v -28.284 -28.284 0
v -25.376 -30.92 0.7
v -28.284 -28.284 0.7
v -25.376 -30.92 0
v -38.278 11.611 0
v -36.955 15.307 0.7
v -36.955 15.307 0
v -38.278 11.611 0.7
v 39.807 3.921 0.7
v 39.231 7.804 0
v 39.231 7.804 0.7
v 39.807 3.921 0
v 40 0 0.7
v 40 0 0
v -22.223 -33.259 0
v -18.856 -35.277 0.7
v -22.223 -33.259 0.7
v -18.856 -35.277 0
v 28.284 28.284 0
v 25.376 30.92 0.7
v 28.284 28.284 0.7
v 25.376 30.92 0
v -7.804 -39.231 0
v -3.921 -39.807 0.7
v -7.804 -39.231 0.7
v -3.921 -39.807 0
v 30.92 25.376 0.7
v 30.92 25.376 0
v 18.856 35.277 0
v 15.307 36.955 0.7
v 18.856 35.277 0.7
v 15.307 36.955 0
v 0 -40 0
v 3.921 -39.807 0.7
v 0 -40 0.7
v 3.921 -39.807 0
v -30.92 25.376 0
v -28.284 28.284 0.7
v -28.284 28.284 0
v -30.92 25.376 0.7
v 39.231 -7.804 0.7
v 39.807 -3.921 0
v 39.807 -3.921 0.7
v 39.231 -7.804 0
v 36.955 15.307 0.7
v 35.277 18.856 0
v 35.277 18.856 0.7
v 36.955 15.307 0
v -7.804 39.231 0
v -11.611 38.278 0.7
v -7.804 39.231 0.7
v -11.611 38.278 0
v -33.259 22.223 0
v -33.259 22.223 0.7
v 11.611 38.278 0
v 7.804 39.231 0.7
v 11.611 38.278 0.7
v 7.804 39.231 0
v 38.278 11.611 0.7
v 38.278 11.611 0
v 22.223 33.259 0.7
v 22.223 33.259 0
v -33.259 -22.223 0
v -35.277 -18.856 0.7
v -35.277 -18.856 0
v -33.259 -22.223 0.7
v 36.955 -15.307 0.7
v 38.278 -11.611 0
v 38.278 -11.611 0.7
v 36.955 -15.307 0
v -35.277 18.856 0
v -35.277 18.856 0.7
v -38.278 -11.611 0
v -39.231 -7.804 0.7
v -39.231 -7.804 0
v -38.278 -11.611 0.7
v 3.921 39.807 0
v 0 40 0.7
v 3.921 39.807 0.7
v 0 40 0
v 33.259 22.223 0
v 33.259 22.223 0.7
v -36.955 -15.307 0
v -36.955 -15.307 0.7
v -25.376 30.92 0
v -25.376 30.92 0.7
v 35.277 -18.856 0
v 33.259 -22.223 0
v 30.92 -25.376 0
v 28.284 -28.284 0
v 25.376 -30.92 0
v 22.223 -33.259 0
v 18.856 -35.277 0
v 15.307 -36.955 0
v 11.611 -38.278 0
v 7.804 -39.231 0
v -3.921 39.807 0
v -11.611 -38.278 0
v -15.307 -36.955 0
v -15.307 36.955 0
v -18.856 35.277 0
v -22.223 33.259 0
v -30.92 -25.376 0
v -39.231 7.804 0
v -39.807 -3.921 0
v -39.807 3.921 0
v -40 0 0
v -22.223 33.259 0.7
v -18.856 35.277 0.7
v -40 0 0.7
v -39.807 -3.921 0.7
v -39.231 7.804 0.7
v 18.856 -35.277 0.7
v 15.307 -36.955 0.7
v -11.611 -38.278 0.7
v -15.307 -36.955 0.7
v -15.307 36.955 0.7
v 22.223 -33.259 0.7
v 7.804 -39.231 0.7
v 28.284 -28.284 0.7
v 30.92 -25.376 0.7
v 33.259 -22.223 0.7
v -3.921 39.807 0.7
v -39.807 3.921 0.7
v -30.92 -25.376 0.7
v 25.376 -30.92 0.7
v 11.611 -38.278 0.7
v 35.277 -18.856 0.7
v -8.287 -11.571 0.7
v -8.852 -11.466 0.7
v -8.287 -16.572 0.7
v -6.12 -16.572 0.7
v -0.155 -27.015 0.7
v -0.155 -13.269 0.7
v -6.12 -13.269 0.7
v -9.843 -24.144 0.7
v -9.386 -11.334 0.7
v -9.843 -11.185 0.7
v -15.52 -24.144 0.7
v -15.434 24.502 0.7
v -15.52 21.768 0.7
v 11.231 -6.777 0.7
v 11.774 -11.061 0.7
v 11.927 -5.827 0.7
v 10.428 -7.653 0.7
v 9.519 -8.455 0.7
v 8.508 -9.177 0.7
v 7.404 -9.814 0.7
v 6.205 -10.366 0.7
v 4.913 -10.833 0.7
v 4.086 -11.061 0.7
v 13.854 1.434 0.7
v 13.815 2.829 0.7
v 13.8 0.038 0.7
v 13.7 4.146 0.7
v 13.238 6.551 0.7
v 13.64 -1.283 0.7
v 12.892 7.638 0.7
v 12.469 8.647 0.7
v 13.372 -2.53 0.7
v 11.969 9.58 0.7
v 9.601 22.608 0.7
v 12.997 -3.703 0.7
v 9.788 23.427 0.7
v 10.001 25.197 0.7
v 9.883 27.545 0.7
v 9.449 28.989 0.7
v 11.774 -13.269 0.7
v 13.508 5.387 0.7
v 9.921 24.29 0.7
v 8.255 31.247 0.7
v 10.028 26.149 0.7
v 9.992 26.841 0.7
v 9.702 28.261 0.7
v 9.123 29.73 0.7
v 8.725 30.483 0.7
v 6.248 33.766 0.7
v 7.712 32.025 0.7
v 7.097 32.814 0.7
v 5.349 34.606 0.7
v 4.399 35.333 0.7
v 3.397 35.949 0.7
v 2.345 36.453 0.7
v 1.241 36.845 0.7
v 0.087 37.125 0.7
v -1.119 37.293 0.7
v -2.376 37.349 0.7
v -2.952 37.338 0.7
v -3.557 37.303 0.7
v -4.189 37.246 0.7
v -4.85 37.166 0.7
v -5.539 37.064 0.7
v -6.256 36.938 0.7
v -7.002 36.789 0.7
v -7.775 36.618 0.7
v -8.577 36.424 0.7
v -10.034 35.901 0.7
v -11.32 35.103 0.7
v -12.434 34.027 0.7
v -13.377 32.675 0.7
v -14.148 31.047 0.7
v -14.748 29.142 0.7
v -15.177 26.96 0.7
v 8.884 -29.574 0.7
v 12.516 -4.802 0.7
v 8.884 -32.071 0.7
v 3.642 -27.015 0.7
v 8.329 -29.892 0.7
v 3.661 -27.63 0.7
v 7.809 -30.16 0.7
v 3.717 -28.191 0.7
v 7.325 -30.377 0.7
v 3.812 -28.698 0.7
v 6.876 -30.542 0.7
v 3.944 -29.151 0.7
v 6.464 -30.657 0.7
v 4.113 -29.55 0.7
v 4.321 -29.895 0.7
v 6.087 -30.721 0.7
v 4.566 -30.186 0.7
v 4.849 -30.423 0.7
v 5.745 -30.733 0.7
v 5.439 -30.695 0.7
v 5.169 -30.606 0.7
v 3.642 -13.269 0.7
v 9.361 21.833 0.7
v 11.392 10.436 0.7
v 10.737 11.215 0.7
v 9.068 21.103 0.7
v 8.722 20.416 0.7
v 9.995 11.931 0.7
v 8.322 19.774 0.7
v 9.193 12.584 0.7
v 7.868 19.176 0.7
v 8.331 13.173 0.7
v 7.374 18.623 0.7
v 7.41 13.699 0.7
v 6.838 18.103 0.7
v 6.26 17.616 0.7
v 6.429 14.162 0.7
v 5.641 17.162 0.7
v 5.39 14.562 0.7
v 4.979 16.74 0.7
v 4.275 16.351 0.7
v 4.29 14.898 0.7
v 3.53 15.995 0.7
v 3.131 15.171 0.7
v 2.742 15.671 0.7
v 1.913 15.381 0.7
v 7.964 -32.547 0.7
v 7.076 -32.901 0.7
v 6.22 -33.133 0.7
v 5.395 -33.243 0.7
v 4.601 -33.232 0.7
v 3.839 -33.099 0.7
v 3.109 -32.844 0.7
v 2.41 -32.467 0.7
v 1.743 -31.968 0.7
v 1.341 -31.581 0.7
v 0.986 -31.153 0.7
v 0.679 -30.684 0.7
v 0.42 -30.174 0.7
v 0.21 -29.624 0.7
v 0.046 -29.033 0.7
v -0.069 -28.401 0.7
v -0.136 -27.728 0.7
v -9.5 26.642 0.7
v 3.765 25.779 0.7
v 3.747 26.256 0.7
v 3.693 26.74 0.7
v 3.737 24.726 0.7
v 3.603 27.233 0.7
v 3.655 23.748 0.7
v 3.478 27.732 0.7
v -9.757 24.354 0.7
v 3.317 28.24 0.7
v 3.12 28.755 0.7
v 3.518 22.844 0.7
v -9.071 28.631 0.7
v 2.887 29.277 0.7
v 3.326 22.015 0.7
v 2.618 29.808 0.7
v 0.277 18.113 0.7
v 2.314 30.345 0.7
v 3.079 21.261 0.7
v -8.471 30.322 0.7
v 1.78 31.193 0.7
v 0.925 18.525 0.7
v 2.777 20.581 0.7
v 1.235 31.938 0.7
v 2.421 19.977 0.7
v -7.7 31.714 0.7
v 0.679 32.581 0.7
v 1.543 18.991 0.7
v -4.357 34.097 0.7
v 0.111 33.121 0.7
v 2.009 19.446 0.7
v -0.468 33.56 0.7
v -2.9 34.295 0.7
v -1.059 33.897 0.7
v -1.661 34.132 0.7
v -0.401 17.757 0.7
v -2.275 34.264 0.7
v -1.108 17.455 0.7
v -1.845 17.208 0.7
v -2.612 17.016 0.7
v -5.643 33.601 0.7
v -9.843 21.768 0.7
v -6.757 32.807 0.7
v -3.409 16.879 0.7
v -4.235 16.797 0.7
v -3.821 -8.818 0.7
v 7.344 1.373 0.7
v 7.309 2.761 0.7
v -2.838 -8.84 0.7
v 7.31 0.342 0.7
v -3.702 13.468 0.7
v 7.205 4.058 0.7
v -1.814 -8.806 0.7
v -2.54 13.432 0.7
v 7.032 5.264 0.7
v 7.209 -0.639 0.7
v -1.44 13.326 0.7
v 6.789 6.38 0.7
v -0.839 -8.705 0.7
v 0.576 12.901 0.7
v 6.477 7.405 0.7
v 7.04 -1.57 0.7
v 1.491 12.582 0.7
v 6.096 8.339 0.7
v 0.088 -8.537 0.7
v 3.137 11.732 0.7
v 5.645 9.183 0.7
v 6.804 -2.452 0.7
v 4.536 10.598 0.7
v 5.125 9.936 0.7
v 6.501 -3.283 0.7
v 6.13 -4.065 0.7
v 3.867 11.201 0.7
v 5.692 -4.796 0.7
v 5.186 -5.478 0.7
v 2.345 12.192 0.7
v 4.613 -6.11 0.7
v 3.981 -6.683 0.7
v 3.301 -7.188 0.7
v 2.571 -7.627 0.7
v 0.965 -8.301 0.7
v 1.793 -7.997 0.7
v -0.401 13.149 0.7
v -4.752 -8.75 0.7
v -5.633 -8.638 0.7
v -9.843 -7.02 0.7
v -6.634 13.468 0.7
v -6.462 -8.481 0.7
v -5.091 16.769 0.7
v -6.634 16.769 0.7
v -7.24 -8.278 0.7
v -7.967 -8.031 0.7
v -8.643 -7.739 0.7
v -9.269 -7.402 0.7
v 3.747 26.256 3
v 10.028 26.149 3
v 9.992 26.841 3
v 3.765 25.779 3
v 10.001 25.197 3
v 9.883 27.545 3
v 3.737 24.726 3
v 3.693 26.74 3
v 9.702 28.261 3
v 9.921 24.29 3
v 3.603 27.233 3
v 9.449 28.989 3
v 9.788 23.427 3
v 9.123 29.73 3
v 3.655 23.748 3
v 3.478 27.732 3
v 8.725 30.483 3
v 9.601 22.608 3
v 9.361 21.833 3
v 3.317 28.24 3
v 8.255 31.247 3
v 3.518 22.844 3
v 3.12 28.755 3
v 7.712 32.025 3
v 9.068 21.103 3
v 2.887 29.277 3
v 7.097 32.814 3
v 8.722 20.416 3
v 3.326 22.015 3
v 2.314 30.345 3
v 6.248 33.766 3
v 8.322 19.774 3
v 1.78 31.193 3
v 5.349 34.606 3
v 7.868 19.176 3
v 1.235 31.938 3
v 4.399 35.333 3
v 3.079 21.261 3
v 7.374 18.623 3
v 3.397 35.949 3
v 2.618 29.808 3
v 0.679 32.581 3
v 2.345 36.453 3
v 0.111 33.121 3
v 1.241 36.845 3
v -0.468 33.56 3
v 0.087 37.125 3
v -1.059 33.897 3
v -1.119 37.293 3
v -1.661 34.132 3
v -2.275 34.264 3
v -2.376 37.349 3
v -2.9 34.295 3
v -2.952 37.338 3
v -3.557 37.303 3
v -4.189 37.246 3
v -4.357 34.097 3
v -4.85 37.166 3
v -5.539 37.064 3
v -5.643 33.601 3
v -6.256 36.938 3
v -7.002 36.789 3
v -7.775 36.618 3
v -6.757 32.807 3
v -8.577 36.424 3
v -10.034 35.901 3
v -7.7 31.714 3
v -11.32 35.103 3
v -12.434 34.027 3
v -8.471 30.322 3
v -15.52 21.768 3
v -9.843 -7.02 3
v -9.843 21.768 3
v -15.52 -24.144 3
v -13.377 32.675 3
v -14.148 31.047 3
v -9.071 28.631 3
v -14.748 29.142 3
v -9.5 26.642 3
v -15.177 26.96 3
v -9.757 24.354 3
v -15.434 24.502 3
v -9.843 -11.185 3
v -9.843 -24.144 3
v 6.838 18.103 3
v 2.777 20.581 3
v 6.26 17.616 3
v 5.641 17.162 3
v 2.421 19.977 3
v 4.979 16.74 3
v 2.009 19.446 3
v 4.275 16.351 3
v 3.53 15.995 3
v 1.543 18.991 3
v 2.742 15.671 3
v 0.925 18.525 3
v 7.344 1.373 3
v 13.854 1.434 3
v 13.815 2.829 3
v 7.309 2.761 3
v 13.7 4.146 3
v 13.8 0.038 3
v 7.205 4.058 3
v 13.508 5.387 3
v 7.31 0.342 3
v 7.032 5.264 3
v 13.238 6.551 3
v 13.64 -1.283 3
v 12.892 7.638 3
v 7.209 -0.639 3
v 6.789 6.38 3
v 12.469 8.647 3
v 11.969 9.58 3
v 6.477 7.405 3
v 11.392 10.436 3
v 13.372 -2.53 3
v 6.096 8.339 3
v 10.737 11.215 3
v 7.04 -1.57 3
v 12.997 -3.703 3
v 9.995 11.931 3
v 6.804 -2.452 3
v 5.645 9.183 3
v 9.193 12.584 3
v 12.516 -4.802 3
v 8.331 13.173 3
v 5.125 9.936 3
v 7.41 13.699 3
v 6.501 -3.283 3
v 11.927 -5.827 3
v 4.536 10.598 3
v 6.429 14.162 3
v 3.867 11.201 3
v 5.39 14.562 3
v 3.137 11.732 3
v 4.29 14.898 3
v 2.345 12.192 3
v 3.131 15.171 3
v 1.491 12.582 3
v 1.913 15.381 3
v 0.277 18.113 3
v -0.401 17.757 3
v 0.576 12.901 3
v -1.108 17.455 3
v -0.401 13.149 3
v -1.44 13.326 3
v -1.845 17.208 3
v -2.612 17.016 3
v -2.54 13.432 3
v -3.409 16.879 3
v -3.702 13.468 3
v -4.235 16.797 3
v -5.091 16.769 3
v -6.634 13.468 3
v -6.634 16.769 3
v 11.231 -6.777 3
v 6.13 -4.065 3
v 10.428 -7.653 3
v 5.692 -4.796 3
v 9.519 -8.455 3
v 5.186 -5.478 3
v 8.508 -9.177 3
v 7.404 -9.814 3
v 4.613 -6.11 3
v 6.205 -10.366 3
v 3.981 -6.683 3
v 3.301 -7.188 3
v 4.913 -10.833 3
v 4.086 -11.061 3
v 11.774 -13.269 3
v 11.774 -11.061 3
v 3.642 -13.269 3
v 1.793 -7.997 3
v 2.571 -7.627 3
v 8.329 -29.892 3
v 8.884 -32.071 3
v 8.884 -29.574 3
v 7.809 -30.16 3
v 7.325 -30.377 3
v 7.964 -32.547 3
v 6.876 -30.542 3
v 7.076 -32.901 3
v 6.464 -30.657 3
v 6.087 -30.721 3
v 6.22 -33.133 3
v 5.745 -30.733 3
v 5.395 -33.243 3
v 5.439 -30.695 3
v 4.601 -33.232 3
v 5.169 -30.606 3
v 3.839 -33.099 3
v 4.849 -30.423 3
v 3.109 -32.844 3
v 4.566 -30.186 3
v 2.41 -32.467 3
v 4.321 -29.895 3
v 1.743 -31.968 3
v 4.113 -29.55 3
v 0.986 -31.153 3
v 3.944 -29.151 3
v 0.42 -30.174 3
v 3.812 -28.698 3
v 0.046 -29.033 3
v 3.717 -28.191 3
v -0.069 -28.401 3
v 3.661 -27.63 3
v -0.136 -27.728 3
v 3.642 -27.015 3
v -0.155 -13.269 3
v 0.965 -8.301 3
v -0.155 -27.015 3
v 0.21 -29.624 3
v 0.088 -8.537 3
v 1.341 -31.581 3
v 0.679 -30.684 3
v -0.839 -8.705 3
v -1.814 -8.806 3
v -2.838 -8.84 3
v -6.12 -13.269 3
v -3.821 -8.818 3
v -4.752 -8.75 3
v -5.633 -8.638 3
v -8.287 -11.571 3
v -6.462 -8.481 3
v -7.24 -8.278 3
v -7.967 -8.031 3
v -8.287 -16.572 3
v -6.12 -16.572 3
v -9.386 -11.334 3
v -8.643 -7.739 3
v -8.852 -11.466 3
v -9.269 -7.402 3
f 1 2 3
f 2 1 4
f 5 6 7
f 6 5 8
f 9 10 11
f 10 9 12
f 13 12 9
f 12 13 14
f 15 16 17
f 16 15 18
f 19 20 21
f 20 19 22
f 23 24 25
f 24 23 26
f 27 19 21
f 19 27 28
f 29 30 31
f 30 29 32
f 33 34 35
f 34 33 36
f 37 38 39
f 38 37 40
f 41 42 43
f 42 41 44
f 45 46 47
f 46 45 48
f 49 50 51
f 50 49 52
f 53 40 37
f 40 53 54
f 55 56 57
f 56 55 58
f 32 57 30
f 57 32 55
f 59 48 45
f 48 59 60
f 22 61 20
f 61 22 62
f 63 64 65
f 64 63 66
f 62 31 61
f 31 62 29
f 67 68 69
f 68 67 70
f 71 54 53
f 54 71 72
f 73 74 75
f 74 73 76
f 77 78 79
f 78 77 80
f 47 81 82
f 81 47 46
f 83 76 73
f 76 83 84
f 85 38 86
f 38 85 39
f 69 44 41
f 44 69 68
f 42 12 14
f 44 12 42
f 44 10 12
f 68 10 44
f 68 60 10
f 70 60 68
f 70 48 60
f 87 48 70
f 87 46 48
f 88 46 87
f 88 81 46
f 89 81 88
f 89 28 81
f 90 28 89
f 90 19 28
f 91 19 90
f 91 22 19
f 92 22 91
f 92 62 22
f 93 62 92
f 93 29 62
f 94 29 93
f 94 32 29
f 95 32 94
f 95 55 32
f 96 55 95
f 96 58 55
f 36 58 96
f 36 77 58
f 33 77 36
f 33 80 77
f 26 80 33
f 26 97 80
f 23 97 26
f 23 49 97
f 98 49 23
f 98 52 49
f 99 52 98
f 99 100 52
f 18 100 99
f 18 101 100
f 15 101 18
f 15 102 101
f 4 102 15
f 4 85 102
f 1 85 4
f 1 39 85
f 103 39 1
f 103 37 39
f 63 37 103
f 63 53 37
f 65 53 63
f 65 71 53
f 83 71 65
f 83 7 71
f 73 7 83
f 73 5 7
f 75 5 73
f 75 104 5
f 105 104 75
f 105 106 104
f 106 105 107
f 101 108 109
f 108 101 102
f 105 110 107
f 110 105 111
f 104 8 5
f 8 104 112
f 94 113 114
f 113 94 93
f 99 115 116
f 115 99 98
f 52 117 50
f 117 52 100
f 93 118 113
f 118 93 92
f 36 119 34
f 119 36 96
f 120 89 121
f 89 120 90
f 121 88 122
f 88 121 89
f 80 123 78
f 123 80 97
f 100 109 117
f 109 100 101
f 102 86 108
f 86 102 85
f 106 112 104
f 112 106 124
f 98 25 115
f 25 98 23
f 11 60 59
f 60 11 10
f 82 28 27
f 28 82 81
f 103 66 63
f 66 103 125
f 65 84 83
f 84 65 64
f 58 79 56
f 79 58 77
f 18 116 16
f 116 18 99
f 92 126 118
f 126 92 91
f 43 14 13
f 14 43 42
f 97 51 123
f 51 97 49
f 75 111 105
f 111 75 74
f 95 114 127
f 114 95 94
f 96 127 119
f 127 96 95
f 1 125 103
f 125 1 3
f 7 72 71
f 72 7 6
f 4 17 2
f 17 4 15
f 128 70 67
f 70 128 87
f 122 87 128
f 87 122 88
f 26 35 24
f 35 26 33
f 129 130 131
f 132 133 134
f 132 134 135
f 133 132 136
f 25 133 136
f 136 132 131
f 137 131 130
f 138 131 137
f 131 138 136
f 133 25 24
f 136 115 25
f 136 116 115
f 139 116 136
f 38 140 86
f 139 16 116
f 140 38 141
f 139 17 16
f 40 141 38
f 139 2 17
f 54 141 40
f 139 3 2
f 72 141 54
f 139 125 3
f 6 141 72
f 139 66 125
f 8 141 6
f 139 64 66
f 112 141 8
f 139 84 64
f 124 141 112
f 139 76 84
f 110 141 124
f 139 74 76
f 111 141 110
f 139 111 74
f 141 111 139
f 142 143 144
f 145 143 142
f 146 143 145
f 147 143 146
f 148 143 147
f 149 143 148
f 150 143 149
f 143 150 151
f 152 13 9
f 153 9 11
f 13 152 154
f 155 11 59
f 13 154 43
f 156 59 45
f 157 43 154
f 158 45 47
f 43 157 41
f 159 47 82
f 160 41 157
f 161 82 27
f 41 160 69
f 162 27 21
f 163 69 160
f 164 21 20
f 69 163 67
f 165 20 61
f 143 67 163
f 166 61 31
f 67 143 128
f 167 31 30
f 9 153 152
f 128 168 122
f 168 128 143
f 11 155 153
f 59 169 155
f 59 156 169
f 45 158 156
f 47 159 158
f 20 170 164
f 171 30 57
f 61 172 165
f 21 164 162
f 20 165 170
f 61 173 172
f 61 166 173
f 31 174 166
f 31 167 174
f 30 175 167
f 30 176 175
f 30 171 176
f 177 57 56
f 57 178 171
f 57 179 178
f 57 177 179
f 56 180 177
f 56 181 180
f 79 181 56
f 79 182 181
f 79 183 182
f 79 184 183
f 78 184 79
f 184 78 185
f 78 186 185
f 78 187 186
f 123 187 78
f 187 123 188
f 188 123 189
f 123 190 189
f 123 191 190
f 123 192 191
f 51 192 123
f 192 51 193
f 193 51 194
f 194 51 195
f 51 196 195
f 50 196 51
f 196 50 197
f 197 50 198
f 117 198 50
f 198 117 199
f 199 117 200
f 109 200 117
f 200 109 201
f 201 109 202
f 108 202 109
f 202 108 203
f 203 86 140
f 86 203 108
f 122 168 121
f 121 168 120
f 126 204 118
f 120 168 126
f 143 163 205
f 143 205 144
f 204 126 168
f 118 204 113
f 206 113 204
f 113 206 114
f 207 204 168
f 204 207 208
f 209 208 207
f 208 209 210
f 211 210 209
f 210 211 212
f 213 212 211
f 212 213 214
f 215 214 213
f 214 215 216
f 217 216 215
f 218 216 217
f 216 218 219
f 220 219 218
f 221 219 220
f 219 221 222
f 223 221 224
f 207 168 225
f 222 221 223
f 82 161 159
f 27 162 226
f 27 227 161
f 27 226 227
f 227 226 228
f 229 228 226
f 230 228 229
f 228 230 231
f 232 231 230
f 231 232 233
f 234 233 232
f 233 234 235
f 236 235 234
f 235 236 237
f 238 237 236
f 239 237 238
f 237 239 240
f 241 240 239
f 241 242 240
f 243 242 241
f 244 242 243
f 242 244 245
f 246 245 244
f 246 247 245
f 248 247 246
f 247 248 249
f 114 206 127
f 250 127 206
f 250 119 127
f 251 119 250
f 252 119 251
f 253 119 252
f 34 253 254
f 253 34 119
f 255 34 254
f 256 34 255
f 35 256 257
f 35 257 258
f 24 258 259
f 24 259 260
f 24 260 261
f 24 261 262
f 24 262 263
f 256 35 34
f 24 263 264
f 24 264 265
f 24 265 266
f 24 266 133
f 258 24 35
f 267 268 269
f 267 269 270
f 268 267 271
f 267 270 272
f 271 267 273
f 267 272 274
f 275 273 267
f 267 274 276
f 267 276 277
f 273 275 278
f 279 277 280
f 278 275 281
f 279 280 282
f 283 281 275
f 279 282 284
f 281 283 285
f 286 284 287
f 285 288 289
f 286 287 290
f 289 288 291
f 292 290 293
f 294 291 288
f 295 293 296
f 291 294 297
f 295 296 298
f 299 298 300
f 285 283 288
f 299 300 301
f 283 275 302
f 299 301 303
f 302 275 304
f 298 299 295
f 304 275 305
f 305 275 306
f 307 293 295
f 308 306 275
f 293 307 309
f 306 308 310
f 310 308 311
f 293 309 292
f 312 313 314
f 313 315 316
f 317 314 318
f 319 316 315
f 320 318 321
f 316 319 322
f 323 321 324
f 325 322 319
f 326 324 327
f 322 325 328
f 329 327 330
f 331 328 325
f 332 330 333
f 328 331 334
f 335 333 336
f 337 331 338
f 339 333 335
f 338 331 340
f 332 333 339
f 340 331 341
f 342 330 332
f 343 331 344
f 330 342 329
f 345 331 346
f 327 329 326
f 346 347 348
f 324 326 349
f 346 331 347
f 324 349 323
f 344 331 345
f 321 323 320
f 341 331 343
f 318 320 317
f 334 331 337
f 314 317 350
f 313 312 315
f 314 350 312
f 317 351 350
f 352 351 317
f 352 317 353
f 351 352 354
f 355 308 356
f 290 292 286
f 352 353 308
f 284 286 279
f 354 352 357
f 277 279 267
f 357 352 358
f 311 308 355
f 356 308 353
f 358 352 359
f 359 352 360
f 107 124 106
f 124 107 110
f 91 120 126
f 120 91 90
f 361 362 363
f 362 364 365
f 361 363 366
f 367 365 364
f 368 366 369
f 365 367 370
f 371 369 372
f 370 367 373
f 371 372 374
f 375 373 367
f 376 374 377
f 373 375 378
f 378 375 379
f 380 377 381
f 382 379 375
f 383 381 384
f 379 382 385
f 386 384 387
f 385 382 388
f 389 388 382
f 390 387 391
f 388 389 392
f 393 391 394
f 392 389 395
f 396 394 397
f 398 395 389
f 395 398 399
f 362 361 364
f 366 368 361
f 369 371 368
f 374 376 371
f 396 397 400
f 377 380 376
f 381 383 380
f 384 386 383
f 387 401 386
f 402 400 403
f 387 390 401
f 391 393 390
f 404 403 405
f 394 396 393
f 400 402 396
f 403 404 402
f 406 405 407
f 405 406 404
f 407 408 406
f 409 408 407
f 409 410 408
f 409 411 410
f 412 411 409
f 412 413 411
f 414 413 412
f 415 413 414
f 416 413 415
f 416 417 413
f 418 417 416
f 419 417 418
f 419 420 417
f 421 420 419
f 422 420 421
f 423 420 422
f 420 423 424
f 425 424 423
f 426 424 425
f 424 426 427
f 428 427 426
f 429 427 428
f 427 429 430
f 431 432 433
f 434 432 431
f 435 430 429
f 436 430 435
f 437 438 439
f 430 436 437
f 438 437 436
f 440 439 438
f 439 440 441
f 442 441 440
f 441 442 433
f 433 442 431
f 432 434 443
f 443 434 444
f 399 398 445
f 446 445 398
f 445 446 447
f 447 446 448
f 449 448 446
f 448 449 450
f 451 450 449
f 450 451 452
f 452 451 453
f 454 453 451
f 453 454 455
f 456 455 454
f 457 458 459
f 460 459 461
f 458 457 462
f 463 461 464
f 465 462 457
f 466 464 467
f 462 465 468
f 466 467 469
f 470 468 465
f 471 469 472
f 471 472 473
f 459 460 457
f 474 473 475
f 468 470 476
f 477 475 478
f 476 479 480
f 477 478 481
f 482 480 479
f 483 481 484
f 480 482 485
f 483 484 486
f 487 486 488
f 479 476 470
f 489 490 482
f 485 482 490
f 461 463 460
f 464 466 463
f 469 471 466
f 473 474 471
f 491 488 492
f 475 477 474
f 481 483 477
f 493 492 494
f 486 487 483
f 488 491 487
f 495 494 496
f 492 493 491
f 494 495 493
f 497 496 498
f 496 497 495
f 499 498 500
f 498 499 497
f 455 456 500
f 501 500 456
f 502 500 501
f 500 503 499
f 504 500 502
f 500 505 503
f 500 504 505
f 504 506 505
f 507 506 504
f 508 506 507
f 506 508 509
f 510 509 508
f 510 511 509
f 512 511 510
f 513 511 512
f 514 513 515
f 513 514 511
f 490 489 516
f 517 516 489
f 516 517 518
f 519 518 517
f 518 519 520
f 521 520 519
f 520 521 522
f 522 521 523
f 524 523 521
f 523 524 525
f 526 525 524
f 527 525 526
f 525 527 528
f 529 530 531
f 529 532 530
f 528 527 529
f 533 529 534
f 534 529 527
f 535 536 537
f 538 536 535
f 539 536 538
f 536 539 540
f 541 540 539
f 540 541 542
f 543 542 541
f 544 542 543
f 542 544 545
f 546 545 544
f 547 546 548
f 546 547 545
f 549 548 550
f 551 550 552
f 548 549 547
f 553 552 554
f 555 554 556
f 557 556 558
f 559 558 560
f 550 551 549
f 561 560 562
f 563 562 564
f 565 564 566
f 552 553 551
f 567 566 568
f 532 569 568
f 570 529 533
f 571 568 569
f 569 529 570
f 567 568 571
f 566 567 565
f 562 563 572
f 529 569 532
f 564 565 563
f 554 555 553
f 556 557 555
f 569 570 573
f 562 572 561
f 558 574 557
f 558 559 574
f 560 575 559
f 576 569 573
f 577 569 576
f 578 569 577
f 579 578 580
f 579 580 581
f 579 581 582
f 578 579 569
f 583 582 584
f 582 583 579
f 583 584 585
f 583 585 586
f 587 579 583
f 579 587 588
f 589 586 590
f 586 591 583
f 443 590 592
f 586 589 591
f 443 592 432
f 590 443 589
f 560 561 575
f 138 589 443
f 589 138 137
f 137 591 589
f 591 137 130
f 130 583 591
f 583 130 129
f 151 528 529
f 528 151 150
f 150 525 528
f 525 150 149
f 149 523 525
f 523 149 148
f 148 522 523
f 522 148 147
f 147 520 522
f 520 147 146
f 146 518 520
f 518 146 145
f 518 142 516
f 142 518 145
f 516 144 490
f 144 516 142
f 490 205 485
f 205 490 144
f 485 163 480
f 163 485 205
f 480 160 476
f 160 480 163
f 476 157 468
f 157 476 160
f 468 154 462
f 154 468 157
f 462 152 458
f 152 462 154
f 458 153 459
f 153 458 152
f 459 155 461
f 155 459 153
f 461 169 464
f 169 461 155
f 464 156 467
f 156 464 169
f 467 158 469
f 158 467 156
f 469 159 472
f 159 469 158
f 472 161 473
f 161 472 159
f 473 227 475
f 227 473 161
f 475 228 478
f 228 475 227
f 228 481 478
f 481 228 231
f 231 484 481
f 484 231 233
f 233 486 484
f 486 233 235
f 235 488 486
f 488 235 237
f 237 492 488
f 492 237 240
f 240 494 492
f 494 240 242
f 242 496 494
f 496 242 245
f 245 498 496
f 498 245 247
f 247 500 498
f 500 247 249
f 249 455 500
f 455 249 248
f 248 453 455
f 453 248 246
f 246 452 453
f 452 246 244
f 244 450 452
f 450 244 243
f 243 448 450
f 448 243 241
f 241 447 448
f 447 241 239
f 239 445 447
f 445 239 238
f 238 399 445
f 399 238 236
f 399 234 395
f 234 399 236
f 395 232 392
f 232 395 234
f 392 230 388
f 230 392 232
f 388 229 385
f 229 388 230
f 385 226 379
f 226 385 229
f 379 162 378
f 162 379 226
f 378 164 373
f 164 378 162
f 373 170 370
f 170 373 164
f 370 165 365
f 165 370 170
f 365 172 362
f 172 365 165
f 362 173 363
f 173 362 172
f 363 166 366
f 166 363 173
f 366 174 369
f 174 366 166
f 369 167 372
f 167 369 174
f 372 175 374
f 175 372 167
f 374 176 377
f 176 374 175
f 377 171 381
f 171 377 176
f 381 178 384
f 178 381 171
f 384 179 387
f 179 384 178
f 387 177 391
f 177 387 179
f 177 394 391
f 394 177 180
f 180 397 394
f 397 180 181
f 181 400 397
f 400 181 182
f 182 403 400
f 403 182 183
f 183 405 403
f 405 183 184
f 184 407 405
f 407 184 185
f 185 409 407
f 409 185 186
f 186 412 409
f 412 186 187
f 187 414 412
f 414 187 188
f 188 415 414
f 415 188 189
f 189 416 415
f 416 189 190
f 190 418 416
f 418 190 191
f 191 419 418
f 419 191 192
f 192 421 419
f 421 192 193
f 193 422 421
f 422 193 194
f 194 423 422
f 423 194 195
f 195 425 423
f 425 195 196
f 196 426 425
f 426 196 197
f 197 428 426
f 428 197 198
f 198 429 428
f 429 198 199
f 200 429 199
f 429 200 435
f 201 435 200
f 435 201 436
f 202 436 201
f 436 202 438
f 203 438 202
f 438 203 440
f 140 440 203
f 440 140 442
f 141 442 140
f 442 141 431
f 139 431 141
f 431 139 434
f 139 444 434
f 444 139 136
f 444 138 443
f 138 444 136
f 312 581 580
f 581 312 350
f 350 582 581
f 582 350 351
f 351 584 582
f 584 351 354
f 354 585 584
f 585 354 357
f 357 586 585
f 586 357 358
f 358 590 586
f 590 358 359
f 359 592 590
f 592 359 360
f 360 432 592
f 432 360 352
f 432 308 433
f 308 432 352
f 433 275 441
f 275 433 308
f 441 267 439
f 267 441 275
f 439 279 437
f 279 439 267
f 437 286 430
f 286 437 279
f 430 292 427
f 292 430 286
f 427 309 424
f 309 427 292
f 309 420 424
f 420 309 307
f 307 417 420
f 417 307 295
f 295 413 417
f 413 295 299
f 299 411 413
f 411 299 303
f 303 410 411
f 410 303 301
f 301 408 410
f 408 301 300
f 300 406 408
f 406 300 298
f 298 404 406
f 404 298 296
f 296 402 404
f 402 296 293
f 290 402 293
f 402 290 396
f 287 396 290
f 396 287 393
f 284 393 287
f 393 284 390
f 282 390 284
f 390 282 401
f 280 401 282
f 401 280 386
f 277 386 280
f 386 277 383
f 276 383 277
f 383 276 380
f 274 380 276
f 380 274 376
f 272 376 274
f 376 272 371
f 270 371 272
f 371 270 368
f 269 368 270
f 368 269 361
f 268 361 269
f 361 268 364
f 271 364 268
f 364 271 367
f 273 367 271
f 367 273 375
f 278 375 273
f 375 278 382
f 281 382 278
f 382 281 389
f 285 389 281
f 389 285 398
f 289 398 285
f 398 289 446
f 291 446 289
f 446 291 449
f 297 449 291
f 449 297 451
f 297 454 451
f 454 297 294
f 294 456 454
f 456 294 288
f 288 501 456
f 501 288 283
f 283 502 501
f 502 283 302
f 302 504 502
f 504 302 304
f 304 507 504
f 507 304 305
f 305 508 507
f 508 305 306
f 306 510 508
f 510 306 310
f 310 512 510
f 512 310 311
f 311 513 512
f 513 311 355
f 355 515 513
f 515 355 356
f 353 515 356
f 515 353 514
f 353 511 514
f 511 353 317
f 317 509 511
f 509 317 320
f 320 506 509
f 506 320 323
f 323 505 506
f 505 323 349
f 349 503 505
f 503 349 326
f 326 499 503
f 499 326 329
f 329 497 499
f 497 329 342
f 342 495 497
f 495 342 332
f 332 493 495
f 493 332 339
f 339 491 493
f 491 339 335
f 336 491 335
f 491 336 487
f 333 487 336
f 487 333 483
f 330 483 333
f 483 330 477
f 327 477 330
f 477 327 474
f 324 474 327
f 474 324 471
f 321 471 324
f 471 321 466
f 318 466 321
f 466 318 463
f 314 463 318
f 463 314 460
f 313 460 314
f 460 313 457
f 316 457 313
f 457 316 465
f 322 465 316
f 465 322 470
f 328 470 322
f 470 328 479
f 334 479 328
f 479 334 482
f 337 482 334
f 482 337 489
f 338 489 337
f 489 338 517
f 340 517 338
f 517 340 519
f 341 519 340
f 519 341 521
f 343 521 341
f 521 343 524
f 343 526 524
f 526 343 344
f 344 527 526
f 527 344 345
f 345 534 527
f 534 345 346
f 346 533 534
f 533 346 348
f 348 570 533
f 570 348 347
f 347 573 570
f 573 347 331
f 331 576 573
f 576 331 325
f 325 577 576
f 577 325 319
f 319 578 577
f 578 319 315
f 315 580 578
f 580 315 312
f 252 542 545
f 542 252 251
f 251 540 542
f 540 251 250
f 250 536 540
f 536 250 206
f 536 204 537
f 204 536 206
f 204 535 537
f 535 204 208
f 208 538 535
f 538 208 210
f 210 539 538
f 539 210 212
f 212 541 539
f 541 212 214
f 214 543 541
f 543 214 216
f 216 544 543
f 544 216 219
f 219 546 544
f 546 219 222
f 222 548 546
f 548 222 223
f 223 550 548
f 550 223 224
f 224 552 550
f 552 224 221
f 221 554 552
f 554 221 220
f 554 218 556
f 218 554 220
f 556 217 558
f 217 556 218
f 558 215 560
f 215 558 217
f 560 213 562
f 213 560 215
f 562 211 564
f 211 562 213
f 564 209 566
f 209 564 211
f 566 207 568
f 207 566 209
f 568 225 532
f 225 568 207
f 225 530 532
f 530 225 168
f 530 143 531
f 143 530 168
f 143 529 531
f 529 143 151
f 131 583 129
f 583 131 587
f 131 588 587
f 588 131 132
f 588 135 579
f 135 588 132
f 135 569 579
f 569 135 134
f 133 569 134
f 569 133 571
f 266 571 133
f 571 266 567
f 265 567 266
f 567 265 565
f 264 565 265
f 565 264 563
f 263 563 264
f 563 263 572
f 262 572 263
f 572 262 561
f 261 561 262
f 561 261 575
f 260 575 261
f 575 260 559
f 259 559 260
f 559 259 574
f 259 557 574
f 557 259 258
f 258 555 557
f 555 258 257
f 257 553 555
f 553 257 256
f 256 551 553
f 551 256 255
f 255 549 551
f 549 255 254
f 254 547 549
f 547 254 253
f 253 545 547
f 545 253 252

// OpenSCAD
$fn = 64;

font = "Palatino";
font_size = 35;
tykkelse = 1;
fres = .3;
content_b = "β";
content_t = "τ";

//translate([0,-90,0]) {
    cylinder(r=40,h=tykkelse-fres);
    translate ([-19.5,-11,0]) {
        linear_extrude(height = tykkelse*3) {
            text(content_b, font = font, size = font_size*1.3);
        }
    }
    translate ([-10,-33,0]) {
        linear_extrude(height = tykkelse*3) {
            text(content_t, font = font, size = font_size/1.15);
        }
    }
//}
